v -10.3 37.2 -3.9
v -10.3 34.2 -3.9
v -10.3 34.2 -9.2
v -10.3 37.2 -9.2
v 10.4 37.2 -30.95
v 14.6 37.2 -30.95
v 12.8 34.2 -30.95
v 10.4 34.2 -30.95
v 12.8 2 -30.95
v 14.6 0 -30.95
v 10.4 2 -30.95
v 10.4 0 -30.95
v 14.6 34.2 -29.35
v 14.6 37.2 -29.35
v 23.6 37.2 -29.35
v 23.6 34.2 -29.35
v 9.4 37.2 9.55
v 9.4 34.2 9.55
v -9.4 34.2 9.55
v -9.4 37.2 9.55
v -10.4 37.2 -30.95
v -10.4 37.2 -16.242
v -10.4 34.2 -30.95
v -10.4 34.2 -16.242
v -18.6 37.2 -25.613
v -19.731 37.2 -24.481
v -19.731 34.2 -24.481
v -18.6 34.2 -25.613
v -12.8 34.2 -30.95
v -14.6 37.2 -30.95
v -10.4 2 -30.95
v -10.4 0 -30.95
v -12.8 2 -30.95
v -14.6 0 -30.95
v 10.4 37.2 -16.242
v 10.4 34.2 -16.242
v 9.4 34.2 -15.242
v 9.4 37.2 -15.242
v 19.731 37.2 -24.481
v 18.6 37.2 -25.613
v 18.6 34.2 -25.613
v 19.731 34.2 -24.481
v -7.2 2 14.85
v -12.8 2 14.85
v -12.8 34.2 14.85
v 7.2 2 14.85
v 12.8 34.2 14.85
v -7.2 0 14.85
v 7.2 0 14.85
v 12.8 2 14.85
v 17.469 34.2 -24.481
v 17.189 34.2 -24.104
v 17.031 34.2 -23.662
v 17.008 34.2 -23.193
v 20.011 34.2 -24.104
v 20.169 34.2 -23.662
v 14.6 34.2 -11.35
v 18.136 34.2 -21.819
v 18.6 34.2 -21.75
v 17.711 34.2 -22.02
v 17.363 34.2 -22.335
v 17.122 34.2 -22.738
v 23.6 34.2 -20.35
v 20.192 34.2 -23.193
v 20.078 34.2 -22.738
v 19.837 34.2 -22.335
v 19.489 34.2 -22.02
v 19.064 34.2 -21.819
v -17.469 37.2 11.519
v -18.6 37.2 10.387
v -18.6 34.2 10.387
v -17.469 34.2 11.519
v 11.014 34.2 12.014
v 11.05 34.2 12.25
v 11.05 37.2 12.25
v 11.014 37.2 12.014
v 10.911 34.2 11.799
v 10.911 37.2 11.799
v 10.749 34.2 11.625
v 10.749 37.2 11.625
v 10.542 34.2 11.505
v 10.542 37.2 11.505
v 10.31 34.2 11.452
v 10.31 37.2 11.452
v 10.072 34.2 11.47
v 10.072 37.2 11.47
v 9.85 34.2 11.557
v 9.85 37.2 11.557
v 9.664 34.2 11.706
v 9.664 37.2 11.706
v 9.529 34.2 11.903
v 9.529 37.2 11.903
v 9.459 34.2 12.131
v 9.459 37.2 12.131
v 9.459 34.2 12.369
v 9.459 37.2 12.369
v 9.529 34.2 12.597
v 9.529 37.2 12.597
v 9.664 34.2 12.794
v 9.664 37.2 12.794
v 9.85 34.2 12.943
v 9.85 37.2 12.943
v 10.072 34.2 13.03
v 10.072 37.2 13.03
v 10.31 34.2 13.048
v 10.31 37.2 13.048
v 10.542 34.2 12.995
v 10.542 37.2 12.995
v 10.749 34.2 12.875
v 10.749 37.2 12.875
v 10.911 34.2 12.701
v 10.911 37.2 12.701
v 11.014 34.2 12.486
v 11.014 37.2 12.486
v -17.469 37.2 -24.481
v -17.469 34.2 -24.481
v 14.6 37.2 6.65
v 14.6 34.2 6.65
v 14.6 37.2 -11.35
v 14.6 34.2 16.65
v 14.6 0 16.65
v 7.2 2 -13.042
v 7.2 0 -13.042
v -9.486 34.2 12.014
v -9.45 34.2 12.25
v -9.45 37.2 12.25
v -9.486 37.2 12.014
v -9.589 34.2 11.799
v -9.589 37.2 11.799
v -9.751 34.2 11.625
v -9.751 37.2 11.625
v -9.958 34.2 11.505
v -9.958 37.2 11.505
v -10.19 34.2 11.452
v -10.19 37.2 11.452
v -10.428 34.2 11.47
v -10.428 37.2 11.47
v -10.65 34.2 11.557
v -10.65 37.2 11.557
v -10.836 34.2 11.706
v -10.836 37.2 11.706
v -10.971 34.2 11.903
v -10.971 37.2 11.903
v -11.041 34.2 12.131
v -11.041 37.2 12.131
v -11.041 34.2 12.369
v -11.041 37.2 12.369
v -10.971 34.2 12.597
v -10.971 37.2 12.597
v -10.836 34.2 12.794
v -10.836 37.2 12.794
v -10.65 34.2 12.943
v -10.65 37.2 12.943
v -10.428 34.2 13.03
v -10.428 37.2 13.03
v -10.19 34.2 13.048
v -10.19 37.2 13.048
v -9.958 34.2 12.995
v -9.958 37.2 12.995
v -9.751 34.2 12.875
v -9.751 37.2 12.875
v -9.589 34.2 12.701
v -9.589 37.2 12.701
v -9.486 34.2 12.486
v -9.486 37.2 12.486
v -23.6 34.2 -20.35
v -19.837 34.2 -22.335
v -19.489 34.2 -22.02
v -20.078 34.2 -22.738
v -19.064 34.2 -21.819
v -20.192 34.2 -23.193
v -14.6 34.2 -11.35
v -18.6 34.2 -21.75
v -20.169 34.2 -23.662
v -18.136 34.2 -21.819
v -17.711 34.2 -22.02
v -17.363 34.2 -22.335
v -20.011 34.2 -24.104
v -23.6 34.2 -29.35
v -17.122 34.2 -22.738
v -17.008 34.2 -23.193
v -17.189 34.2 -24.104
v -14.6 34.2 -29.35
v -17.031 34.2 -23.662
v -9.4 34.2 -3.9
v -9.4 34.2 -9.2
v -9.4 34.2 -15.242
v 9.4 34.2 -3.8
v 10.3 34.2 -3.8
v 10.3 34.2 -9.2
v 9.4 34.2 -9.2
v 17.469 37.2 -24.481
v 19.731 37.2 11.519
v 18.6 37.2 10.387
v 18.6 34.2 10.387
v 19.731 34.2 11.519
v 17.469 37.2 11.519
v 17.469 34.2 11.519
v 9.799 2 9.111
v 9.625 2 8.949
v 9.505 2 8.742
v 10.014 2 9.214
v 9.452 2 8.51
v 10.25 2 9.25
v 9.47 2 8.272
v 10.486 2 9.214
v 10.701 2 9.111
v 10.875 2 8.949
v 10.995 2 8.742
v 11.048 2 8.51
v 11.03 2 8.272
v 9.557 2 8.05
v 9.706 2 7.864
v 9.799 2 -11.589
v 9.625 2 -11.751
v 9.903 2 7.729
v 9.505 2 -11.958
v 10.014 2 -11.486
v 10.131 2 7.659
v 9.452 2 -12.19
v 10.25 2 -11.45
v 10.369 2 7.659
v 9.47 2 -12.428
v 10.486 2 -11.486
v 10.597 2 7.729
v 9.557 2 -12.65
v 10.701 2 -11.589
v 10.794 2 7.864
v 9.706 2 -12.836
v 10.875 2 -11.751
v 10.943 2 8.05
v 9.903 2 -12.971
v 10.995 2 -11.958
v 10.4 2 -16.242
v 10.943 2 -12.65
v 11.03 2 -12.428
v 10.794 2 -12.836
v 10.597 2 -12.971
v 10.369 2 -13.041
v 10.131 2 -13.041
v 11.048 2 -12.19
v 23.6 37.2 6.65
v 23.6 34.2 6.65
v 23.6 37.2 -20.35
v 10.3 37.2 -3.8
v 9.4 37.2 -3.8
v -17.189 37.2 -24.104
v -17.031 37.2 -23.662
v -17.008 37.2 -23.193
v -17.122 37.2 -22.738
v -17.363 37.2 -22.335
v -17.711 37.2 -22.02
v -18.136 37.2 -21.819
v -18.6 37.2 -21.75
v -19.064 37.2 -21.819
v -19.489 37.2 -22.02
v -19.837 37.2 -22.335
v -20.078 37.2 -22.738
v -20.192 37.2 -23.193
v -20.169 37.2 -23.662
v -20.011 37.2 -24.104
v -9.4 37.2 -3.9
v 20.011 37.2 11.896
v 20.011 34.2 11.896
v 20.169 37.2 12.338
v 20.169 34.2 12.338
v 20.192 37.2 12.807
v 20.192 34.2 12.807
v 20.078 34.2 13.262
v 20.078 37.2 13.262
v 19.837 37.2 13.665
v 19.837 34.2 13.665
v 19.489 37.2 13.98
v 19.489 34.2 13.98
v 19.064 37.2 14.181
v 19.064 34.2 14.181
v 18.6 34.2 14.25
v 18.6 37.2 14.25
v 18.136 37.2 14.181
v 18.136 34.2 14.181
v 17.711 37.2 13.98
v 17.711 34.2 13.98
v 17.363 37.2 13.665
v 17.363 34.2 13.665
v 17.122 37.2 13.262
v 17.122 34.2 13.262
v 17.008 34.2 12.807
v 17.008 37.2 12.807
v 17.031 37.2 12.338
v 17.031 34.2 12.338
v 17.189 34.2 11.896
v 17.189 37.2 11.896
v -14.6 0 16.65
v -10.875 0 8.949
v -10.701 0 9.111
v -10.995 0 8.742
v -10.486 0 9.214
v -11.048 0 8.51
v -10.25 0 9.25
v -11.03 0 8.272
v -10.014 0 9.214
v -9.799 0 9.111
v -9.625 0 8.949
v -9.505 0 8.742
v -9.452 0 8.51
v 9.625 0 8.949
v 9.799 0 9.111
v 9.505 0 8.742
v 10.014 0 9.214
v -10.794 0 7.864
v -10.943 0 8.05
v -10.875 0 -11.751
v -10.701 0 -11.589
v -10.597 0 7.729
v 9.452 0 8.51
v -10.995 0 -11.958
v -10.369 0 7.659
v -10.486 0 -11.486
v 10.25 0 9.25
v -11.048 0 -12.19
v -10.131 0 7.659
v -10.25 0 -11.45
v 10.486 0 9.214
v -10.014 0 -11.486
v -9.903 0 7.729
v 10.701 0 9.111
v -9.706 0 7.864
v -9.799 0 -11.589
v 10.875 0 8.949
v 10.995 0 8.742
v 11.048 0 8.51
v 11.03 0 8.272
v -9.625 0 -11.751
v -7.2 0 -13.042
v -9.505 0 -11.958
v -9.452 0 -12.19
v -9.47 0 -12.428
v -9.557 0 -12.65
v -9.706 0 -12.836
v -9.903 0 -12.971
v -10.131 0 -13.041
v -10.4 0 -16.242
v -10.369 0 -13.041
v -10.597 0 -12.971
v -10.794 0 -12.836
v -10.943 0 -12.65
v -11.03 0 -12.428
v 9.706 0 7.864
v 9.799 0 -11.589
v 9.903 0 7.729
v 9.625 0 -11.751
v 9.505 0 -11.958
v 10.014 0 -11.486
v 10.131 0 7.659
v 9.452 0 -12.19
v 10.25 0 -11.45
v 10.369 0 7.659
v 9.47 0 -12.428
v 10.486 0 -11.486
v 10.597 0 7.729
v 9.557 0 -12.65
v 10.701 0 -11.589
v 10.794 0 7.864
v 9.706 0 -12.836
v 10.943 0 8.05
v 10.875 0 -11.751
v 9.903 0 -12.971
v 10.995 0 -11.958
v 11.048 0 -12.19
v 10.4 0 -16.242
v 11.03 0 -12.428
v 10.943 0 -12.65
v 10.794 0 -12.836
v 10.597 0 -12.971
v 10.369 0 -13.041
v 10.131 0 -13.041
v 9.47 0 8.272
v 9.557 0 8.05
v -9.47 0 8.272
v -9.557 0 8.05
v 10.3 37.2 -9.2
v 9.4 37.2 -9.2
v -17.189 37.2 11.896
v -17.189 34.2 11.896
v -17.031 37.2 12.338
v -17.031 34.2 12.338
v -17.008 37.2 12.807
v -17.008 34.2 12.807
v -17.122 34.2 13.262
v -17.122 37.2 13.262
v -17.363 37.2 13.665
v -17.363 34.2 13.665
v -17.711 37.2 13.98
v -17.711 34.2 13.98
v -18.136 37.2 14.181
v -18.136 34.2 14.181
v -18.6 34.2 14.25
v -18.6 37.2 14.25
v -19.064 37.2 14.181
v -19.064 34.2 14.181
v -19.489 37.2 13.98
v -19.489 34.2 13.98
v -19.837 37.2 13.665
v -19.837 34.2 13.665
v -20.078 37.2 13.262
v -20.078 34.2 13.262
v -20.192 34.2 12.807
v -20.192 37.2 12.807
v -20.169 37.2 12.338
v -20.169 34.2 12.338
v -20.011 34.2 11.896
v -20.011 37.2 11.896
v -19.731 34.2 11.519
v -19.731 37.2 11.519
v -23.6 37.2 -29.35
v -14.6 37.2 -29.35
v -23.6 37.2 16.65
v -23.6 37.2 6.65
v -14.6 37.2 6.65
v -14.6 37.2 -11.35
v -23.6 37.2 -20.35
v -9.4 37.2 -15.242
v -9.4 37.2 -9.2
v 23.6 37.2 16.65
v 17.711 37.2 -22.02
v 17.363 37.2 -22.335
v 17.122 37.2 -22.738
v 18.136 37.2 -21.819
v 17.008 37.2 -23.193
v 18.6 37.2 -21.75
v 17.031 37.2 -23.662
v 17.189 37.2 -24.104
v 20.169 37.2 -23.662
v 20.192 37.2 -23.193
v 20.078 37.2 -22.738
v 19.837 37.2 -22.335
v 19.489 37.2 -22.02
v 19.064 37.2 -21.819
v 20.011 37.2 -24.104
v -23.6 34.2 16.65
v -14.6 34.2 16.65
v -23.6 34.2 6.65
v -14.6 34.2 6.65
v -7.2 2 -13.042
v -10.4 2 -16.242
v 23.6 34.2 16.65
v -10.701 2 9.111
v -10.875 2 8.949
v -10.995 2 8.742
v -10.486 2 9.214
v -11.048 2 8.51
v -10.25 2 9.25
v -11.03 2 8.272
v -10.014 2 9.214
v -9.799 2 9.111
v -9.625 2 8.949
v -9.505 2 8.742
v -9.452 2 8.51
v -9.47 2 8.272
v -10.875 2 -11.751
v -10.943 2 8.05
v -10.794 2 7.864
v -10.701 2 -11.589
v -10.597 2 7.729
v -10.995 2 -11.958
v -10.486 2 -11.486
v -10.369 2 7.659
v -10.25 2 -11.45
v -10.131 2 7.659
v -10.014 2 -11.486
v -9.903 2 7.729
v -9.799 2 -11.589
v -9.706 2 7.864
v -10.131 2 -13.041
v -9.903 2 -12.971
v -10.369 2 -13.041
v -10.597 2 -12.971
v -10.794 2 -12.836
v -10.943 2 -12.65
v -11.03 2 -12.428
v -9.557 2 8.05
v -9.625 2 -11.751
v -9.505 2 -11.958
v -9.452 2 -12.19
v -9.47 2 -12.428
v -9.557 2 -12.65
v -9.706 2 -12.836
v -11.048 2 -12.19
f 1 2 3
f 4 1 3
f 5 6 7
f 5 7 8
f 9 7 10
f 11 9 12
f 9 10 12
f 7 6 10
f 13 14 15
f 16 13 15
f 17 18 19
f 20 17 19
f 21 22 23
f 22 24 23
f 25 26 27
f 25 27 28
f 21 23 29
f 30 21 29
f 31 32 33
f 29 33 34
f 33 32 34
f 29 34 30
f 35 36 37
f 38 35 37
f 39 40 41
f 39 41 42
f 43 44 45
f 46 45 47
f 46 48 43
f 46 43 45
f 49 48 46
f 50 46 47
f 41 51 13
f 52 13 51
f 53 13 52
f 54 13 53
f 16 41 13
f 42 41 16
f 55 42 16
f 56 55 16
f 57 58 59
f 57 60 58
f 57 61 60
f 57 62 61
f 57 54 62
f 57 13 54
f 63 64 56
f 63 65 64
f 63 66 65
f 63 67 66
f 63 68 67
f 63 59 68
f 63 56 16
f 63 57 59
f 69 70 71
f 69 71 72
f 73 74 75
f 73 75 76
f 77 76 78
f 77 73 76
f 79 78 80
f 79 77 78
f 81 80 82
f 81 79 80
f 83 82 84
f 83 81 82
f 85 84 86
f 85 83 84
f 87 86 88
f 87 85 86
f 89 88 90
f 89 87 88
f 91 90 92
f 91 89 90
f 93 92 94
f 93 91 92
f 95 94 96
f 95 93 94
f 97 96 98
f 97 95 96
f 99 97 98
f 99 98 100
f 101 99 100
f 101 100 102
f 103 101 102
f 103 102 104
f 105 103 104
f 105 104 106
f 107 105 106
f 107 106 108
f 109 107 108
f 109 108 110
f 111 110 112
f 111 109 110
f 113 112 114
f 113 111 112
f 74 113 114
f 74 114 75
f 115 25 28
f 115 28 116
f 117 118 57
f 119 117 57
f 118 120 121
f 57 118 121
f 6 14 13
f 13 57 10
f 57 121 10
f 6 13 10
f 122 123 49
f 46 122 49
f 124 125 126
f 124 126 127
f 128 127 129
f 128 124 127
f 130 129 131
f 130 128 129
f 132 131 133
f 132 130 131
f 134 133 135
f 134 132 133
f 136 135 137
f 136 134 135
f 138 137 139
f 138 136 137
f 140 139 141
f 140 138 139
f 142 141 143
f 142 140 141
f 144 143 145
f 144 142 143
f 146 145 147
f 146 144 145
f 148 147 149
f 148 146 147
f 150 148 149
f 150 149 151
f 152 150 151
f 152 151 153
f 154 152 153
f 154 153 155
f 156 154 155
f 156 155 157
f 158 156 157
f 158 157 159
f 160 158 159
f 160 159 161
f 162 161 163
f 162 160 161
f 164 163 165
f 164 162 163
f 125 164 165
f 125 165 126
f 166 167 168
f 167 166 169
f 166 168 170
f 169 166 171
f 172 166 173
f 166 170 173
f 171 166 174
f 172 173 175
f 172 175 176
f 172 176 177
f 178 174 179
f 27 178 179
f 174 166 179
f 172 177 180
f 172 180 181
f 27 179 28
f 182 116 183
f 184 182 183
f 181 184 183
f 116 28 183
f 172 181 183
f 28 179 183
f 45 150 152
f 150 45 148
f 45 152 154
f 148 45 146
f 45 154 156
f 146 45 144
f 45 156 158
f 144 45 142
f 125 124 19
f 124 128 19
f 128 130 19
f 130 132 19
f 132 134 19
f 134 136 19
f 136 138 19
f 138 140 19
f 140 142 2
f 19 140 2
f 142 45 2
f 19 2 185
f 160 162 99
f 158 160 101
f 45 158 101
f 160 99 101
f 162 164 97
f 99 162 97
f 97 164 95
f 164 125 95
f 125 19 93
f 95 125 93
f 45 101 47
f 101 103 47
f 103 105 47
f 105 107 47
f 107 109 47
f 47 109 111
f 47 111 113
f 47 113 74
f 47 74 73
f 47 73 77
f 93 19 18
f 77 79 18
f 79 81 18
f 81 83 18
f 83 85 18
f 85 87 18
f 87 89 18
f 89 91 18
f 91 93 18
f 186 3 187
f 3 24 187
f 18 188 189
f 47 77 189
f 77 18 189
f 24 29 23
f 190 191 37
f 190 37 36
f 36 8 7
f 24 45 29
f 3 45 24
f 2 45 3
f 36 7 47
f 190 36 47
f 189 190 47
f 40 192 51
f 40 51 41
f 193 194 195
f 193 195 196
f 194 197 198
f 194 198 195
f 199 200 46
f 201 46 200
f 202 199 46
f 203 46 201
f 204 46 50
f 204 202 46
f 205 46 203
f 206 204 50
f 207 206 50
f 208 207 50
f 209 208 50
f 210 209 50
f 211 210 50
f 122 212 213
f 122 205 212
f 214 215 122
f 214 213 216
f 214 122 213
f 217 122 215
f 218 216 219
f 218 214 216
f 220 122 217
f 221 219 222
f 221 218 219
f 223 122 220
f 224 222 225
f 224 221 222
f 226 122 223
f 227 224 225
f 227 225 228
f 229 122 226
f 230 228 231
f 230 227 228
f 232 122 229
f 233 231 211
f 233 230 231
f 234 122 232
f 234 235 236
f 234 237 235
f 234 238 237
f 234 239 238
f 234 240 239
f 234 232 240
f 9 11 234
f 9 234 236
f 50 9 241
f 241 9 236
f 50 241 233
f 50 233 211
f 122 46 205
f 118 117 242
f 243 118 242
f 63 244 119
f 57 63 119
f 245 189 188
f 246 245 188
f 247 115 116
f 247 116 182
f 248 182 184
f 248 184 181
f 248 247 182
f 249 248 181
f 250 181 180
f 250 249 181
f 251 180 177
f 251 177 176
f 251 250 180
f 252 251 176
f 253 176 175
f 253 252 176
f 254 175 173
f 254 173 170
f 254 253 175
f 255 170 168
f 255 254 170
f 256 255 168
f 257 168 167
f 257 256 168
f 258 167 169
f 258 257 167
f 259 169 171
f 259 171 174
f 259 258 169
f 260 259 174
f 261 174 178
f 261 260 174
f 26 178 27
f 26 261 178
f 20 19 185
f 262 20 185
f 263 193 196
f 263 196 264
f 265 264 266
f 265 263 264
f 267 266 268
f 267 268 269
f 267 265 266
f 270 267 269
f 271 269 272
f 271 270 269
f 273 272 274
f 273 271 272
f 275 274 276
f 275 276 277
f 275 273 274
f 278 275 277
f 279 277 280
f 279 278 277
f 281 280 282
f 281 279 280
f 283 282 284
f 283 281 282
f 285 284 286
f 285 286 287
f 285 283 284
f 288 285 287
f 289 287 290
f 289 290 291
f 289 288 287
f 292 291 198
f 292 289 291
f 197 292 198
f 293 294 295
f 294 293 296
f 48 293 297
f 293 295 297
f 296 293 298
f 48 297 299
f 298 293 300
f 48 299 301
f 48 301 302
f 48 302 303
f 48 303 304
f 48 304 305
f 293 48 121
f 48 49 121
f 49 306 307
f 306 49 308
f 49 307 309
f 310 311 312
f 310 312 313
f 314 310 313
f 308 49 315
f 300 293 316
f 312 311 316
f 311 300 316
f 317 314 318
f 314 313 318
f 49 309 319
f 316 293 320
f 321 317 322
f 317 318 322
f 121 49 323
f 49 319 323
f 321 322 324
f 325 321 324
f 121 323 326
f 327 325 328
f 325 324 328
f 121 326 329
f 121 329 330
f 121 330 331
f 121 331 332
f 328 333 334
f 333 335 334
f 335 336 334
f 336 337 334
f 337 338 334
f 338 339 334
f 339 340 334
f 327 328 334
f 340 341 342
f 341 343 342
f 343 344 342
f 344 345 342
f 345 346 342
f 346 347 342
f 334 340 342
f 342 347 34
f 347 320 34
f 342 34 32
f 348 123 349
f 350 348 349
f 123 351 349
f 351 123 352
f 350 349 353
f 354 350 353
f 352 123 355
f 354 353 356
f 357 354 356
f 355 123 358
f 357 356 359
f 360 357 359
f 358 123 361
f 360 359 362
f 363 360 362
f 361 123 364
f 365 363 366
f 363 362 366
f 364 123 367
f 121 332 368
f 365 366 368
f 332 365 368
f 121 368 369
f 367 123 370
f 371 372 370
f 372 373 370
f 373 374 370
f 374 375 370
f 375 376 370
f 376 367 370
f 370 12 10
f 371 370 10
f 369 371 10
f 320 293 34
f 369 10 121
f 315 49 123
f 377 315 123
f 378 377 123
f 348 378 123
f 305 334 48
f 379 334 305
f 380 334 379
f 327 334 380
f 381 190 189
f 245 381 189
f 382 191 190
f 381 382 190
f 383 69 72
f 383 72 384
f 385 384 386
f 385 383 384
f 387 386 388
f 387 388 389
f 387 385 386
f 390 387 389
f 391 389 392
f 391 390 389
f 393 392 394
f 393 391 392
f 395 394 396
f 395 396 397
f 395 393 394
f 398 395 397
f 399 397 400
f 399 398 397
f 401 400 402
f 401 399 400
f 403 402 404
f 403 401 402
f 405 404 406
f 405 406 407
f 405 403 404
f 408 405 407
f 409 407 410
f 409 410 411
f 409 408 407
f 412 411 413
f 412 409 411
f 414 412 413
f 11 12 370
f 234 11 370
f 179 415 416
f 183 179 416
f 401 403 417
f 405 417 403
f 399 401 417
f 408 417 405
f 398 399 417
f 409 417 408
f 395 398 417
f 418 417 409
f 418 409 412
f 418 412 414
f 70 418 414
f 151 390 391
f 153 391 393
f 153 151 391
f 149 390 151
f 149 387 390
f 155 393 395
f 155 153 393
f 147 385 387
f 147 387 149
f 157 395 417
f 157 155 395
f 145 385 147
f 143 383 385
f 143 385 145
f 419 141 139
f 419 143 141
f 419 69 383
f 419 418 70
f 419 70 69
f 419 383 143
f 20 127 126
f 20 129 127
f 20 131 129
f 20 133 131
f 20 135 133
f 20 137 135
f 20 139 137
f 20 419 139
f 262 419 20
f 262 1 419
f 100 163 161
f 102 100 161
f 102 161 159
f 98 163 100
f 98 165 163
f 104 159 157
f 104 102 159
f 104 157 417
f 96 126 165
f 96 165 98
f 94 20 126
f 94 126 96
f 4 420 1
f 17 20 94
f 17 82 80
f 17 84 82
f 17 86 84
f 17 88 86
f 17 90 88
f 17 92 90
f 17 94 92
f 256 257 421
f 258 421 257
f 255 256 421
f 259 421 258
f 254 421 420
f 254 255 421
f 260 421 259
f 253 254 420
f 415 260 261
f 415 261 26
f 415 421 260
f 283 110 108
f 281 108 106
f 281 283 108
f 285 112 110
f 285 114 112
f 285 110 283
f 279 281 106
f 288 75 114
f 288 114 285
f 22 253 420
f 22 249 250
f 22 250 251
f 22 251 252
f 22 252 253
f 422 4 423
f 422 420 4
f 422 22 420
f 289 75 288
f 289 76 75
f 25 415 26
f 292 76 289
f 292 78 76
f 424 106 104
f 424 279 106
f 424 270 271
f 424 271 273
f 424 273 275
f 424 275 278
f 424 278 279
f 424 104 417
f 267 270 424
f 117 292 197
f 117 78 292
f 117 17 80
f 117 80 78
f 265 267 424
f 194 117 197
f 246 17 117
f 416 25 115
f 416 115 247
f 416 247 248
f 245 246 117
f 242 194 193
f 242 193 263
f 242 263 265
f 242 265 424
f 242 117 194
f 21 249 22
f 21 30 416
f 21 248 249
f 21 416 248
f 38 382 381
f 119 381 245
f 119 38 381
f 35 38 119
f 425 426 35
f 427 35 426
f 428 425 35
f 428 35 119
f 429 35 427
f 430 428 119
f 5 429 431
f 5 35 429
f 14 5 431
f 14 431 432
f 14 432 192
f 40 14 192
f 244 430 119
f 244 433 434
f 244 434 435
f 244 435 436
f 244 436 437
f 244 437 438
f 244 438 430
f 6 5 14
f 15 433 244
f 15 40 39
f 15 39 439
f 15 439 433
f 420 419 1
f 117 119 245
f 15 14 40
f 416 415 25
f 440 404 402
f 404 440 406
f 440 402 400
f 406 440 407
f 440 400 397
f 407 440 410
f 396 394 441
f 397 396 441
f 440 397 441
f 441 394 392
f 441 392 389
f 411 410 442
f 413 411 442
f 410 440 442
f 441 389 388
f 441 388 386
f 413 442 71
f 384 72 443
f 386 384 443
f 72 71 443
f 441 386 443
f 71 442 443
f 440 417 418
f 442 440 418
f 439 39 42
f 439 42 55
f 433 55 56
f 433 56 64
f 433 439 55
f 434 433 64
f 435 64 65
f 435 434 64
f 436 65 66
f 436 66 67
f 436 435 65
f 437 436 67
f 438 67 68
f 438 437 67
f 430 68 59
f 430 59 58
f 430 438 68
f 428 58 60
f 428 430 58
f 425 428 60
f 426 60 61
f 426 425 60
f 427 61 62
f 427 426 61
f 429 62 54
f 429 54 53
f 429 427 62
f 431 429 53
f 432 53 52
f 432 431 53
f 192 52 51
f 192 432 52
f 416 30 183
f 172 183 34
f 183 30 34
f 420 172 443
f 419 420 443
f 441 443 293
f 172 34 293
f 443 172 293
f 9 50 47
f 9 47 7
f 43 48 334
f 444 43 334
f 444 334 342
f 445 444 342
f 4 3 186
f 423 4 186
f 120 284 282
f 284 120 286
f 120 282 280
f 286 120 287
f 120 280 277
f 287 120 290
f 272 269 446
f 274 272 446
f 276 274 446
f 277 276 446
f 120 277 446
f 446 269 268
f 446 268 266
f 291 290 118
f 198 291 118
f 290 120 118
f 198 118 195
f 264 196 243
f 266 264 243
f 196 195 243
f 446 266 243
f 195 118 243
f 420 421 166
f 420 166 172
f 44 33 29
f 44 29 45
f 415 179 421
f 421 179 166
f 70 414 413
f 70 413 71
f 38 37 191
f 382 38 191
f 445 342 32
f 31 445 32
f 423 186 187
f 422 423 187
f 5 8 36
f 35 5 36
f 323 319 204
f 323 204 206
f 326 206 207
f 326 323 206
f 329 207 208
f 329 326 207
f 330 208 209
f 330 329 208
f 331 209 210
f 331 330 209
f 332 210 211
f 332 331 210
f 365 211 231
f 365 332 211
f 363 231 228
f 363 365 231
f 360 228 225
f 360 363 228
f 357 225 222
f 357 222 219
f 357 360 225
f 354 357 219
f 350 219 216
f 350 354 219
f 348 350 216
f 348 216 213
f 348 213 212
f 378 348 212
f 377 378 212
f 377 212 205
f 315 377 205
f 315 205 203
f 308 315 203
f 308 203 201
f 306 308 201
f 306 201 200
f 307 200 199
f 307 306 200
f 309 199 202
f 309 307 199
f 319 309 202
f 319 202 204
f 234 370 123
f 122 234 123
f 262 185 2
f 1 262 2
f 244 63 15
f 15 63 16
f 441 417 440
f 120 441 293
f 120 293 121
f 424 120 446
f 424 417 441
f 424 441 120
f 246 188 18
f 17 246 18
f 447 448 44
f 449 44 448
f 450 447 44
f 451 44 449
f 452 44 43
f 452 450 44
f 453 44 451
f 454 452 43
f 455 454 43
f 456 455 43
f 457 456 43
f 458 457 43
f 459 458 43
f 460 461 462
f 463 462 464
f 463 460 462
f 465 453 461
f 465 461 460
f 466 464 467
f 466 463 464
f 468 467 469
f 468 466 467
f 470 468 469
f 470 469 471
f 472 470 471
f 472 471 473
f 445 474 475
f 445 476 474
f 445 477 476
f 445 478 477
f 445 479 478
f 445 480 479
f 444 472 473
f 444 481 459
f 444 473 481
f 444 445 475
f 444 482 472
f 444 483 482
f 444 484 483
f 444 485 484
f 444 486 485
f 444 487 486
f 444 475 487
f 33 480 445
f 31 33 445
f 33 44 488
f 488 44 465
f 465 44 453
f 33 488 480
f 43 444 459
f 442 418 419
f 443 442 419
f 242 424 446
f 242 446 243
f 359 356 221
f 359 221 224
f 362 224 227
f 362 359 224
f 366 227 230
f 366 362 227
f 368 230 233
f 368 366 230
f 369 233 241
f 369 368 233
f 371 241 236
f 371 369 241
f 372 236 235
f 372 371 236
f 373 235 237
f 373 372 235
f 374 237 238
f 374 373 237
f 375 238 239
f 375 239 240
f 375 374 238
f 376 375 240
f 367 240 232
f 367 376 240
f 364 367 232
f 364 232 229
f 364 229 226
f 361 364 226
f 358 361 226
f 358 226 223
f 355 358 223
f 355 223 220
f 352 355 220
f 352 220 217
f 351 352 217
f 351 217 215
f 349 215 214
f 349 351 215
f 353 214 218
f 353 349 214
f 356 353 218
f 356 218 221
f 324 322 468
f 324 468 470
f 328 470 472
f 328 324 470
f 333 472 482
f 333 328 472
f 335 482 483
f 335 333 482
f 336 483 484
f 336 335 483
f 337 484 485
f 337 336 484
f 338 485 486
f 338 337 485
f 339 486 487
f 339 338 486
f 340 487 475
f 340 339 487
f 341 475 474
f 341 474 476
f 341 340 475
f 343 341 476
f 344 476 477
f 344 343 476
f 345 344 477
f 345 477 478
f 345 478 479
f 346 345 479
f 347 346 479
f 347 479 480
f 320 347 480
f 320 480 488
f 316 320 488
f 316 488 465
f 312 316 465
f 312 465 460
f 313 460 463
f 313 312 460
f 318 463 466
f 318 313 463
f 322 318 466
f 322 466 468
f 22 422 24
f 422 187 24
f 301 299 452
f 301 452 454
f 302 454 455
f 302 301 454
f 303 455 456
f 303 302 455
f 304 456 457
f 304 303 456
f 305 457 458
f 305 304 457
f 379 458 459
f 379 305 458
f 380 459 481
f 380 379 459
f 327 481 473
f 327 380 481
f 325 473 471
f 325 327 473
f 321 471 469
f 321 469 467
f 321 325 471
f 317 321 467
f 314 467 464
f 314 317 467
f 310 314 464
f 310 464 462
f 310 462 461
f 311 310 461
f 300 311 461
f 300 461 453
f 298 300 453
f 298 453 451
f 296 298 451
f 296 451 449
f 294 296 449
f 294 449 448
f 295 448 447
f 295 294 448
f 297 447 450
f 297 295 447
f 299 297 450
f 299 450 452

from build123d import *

# Parameters (mm, degrees)
SKETCH1_R               = 0.8
BOSS_EXTRUDE2_DEPTH     = 2
BOSS_EXTRUDE4_DEPTH     = 35.2
BOSS_EXTRUDE7_OUTLINE_R = 0.8
BOSS_EXTRUDE7_DEPTH     = 37.2
SKETCH1_10_R            = 0.8
CUT_EXTRUDE6_DEPTH      = 34.2
SKETCH1_11_R            = 0.8
BOSS_EXTRUDE8_DEPTH     = 2
SKETCH2_W               = 9
SKETCH2_H               = 8
SKETCH2_H_2             = 10
BOSS_EXTRUDE9_DEPTH     = 3
CHAMFER1_SIZE           = 10


# Read off the part's stored shape, not the designer's step: Boss-Extrude7
with BuildPart() as part:
    # Sketch1 → Boss-Extrude2 (new body)
    with BuildSketch(Plane(origin=(0, 0, 0), x_dir=(1, 0, 0), z_dir=(0, 1, 0))):
        Polygon((-10.4, 16.242178951), (-10.4, 30.95), (-14.6, 30.95), (-14.6, -16.65), (14.6, -16.65), (14.6, 30.95), (10.4, 30.95), (10.4, 16.242178951), (7.2, 13.042178951), (7.2, -14.85), (-7.2, -14.85), (-7.2, 13.042178951), align=None)
        with Locations(Location((-10.25, -8.45, 0), (0, 0, 270))):
            Circle(SKETCH1_R, mode=Mode.SUBTRACT)
        with Locations(Location((-10.25, 12.25, 0), (0, 0, 270))):
            Circle(SKETCH1_R, mode=Mode.SUBTRACT)
        with Locations(Location((-10.25, -12.25, 0), (0, 0, 270))):
            Circle(SKETCH1_R, mode=Mode.SUBTRACT)
        with Locations(Location((10.25, -8.45, 0), (0, 0, 270))):
            Circle(SKETCH1_R, mode=Mode.SUBTRACT)
        with Locations(Location((10.25, -12.25, 0), (0, 0, 270))):
            Circle(SKETCH1_R, mode=Mode.SUBTRACT)
        with Locations(Location((10.25, 12.25, 0), (0, 0, 270))):
            Circle(SKETCH1_R, mode=Mode.SUBTRACT)
    extrude(amount=BOSS_EXTRUDE2_DEPTH)

    # Sketch1<6> → Boss-Extrude4 (add)
    with BuildSketch(Plane(origin=(0, 0, 0), x_dir=(1, 0, 0), z_dir=(0, 1, 0))):
        Polygon((-12.8, -14.85), (-12.8, 30.95), (-14.6, 30.95), (-14.6, -16.65), (14.6, -16.65), (14.6, 30.95), (12.8, 30.95), (12.8, -14.85), align=None)
    extrude(amount=BOSS_EXTRUDE4_DEPTH)

    # Boss-Extrude7 outline → Boss-Extrude7 (add)
    with BuildSketch(Plane(origin=(0, 0, 0), x_dir=(1, 0, 0), z_dir=(0, 1, 0))):
        Polygon((14.6, -16.65), (14.6, 30.95), (10.4, 30.95), (10.4, 16.242178951), (9.4, 15.242178951), (9.4, 9.2), (10.3, 9.2), (10.3, 3.8), (9.4, 3.8), (9.4, -9.55), (-9.4, -9.55), (-9.4, 3.9), (-10.3, 3.9), (-10.3, 9.2), (-9.4, 9.2), (-9.4, 15.242178951), (-10.4, 16.242178951), (-10.4, 30.95), (-14.6, 30.95), (-14.6, -16.65), align=None)
        with Locations((-10.25, -12.25)):
            Circle(BOSS_EXTRUDE7_OUTLINE_R, mode=Mode.SUBTRACT)
        with Locations((10.25, -12.25)):
            Circle(BOSS_EXTRUDE7_OUTLINE_R, mode=Mode.SUBTRACT)
    extrude(amount=BOSS_EXTRUDE7_DEPTH)

    # Sketch1<10> → Cut-Extrude6 (cut)
    with BuildSketch(Plane(origin=(0, 0, 0), x_dir=(1, 0, 0), z_dir=(0, 1, 0))):
        Polygon((-10.4, 16.242178951), (-10.4, 30.95), (-12.8, 30.95), (-12.8, -14.85), (12.8, -14.85), (12.8, 30.95), (10.4, 30.95), (10.4, 16.242178951), (7.2, 13.042178951), (7.2, -9.55), (-7.2, -9.55), (-7.2, 13.042178951), align=None)
        with Locations(Location((-10.25, -12.25, 0), (0, 0, 270))):
            Circle(SKETCH1_10_R, mode=Mode.SUBTRACT)
        with Locations(Location((10.25, -12.25, 0), (0, 0, 270))):
            Circle(SKETCH1_10_R, mode=Mode.SUBTRACT)
    extrude(amount=CUT_EXTRUDE6_DEPTH, mode=Mode.SUBTRACT)

    # Sketch1<11> → Boss-Extrude8 (add)
    # profile 1 of 2: a face of its own
    with BuildSketch(Plane(origin=(0, 0, 0), x_dir=(1, 0, 0), z_dir=(0, 1, 0))):
        Polygon((-10.4, 16.242178951), (-10.4, 30.95), (-12.8, 30.95), (-12.8, -14.85), (-7.2, -14.85), (-7.2, 13.042178951), align=None)
        with Locations(Location((-10.25, -8.45, 0), (0, 0, 270))):
            Circle(SKETCH1_11_R, mode=Mode.SUBTRACT)
        with Locations(Location((-10.25, 12.25, 0), (0, 0, 270))):
            Circle(SKETCH1_11_R, mode=Mode.SUBTRACT)
    # profile 2 of 2: a face of its own
    with BuildSketch(Plane(origin=(0, 0, 0), x_dir=(1, 0, 0), z_dir=(0, 1, 0))):
        Polygon((7.2, -14.85), (12.8, -14.85), (12.8, 30.95), (10.4, 30.95), (10.4, 16.242178951), (7.2, 13.042178951), align=None)
        with Locations(Location((10.25, -8.45, 0), (0, 0, 270))):
            Circle(SKETCH1_11_R, mode=Mode.SUBTRACT)
        with Locations(Location((10.25, 12.25, 0), (0, 0, 270))):
            Circle(SKETCH1_11_R, mode=Mode.SUBTRACT)
    extrude(amount=BOSS_EXTRUDE8_DEPTH)

    # Sketch2 → Boss-Extrude9 (add)
    # profile 1 of 4: a face of its own
    with BuildSketch(Plane(origin=(0, 37.2, 0), x_dir=(1, 0, 0), z_dir=(0, 1, 0))):
        with Locations((-19.1, 25.35)):
            Rectangle(SKETCH2_W, SKETCH2_H)
        with BuildLine():
            ThreePointArc((-17.46862915, 24.48137085), (-18.6, 21.75), (-19.73137085, 24.48137085))
            Line((-19.73137085, 24.48137085), (-18.6, 25.6127417))
            Line((-18.6, 25.6127417), (-17.46862915, 24.48137085))
        make_face(mode=Mode.SUBTRACT)
    # profile 2 of 4: a face of its own
    with BuildSketch(Plane(origin=(0, 37.2, 0), x_dir=(1, 0, 0), z_dir=(0, 1, 0))):
        with Locations((19.1, 25.35)):
            Rectangle(SKETCH2_W, SKETCH2_H)
        with BuildLine():
            Line((18.6, 25.6127417), (19.73137085, 24.48137085))
            ThreePointArc((19.73137085, 24.48137085), (18.6, 21.75), (17.46862915, 24.48137085))
            Line((17.46862915, 24.48137085), (18.6, 25.6127417))
        make_face(mode=Mode.SUBTRACT)
    # profile 3 of 4: a face of its own
    with BuildSketch(Plane(origin=(0, 37.2, 0), x_dir=(1, 0, 0), z_dir=(0, 1, 0))):
        with Locations((-19.1, -11.65)):
            Rectangle(SKETCH2_W, SKETCH2_H_2)
        with BuildLine():
            Line((-19.73137085, -11.51862915), (-18.6, -10.3872583))
            Line((-18.6, -10.3872583), (-17.46862915, -11.51862915))
            ThreePointArc((-17.46862915, -11.51862915), (-18.6, -14.25), (-19.73137085, -11.51862915))
        make_face(mode=Mode.SUBTRACT)
    # profile 4 of 4: a face of its own
    with BuildSketch(Plane(origin=(0, 37.2, 0), x_dir=(1, 0, 0), z_dir=(0, 1, 0))):
        with Locations((19.1, -11.65)):
            Rectangle(SKETCH2_W, SKETCH2_H_2)
        with BuildLine():
            Line((17.46862915, -11.51862915), (18.6, -10.3872583))
            Line((18.6, -10.3872583), (19.73137085, -11.51862915))
            ThreePointArc((19.73137085, -11.51862915), (18.6, -14.25), (17.46862915, -11.51862915))
        make_face(mode=Mode.SUBTRACT)
    extrude(amount=-BOSS_EXTRUDE9_DEPTH)

    # Chamfer1
    # the kernel refuses this chamfer: 10 mm, written as the material it adds along each edge
    with BuildSketch(Plane(origin=(14.6, 37.2, -21.35), x_dir=(0.9996219169112968, 0, -0.027495876610586667), z_dir=(0, -1, 0))) as chamfer1_piece_1_section:
        Polygon((CHAMFER1_SIZE * 0.999621916911, CHAMFER1_SIZE * 0.0274958766106), (-CHAMFER1_SIZE * 0.0274958766106, CHAMFER1_SIZE * 0.999621916911), (0, 0), align=None)
    chamfer1_piece_1 = extrude(amount=3, mode=Mode.PRIVATE)
    chamfer1_piece_1 = split(chamfer1_piece_1, bisect_by=Plane(origin=(23.6, 35.7, -17.990992529), z_dir=(-1, 0, 0)), keep=Keep.TOP, mode=Mode.PRIVATE)
    add(chamfer1_piece_1)
    with BuildSketch(Plane(origin=(-14.6, 37.2, -21.35), x_dir=(-0.9996219169112968, 0, -0.027495876610586324), z_dir=(0, -1, 0))) as chamfer1_piece_2_section:
        Polygon((CHAMFER1_SIZE * 0.999621916911, -CHAMFER1_SIZE * 0.0274958766106), (-CHAMFER1_SIZE * 0.0274958766106, -CHAMFER1_SIZE * 0.999621916911), (0, 0), align=None)
    chamfer1_piece_2 = extrude(amount=3, mode=Mode.PRIVATE)
    chamfer1_piece_2 = split(chamfer1_piece_2, bisect_by=Plane(origin=(-23.6, 35.7, -17.990992529), z_dir=(1, 0, 0)), keep=Keep.TOP, mode=Mode.PRIVATE)
    add(chamfer1_piece_2)


solid = part.part
